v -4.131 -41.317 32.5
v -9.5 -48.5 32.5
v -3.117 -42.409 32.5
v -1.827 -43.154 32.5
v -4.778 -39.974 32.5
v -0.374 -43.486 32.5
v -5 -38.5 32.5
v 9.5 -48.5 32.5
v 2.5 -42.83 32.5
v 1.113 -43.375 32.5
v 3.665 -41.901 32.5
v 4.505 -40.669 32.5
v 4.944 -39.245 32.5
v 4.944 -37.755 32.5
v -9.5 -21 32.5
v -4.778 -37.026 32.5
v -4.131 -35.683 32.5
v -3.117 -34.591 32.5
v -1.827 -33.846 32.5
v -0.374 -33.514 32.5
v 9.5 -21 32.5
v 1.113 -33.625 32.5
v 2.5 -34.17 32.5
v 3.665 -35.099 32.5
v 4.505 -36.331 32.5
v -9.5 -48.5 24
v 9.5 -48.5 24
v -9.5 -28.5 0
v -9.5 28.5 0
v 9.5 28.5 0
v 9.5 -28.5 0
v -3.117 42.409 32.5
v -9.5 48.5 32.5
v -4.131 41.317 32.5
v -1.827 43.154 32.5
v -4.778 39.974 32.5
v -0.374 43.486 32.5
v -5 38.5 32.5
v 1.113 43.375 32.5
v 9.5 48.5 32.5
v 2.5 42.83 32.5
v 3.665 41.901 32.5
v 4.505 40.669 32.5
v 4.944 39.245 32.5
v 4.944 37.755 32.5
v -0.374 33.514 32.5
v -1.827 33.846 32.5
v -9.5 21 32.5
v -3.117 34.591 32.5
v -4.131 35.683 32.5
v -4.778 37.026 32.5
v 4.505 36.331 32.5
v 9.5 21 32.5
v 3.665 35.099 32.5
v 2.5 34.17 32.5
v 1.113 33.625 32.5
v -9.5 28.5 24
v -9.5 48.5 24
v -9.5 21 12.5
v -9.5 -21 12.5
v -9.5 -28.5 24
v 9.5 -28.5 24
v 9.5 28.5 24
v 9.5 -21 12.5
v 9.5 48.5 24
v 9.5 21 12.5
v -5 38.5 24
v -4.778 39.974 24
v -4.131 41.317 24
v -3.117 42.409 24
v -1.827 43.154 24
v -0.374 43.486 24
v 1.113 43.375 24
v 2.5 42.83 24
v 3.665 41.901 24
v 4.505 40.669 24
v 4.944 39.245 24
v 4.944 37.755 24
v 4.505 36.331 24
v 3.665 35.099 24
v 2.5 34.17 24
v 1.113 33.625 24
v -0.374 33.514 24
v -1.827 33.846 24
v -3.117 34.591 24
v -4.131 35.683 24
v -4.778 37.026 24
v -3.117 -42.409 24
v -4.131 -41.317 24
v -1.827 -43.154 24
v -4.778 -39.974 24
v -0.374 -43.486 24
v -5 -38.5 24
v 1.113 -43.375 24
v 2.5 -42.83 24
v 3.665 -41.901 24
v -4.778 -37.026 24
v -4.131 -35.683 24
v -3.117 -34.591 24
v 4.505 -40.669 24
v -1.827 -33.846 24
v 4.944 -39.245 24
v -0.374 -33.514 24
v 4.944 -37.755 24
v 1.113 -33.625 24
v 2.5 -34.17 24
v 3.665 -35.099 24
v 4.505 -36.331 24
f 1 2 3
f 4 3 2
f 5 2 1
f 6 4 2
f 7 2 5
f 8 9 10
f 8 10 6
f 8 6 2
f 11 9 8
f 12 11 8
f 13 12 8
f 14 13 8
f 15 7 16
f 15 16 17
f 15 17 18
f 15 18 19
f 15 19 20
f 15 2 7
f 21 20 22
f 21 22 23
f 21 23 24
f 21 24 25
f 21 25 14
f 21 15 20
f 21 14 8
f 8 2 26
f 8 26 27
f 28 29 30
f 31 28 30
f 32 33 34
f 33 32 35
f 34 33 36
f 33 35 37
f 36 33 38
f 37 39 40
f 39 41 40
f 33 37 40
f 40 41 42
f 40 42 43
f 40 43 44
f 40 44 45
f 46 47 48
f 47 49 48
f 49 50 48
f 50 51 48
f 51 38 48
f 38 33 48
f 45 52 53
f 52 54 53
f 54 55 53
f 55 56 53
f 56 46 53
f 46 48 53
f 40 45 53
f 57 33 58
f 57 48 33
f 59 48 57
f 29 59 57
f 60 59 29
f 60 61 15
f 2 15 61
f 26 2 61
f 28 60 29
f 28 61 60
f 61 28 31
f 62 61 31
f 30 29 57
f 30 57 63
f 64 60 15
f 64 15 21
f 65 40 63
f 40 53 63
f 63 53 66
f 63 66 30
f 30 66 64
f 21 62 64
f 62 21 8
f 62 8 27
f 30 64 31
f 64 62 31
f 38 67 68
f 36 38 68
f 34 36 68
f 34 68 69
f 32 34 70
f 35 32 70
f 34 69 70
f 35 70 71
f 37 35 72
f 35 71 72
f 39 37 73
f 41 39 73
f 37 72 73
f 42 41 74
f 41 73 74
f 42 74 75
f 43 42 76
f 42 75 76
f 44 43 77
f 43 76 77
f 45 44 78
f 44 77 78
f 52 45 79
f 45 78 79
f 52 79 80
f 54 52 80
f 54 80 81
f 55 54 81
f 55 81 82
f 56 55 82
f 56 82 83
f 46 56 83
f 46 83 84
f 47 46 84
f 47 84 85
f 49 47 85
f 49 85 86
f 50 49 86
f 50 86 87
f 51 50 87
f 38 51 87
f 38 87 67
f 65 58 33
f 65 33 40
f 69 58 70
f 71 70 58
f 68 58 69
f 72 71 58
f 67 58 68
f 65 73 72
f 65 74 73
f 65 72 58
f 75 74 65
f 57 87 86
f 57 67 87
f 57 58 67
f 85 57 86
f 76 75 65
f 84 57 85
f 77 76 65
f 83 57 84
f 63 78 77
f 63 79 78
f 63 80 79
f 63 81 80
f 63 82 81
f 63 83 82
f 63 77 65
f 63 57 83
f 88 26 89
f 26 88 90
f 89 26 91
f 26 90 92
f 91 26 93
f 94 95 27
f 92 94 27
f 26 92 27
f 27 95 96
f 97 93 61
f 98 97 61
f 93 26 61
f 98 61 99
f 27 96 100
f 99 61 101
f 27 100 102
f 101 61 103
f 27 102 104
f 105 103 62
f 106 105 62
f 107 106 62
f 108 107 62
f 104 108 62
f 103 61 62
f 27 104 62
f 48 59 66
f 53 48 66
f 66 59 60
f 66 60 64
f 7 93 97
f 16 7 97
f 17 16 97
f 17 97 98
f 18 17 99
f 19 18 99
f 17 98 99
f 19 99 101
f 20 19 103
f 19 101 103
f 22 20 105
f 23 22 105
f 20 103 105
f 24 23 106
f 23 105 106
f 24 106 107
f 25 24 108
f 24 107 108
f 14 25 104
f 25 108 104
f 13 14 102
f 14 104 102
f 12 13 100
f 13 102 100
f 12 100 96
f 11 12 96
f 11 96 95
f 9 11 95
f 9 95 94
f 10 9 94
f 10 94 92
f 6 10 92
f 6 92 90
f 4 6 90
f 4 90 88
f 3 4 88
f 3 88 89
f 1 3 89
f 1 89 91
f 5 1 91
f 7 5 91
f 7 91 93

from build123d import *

# Parameters (mm, degrees)
SKETCH1_W           = 19
SKETCH1_H           = 57
BOSS_EXTRUDE1_DEPTH = 12.5
SKETCH2_W           = 19
SKETCH2_H           = 7.5
BOSS_EXTRUDE2_DEPTH = 20
SKETCH3_W           = 19
SKETCH3_H           = 8.5
BOSS_EXTRUDE3_DEPTH = 20
SKETCH4_W           = 19
SKETCH4_H           = 8.5
BOSS_EXTRUDE4_DEPTH = 20
SKETCH5_R           = 5
CUT_EXTRUDE1_DEPTH  = 20


with BuildPart() as part:
    # Sketch1 → Boss-Extrude1 (new body)
    with BuildSketch(Plane.XY):
        Rectangle(SKETCH1_W, SKETCH1_H)
    extrude(amount=BOSS_EXTRUDE1_DEPTH)

    # Sketch2 → Boss-Extrude2 (add)
    with BuildSketch(Plane.XY.offset(12.5)):
        with Locations((0, -24.75)):
            Rectangle(SKETCH2_W, SKETCH2_H)
        with Locations((0, 24.75)):
            Rectangle(SKETCH2_W, SKETCH2_H)
    extrude(amount=BOSS_EXTRUDE2_DEPTH)

    # Sketch3 → Boss-Extrude3 (add)
    with BuildSketch(Plane.XZ.offset(28.5)):
        with Locations((0, 28.25)):
            Rectangle(SKETCH3_W, SKETCH3_H)
    extrude(amount=BOSS_EXTRUDE3_DEPTH)

    # Sketch4 → Boss-Extrude4 (add)
    with BuildSketch(Plane(origin=(0, 28.5, 0), x_dir=(1, 0, 0), z_dir=(0, 1, 0))):
        with Locations((0, -28.25)):
            Rectangle(SKETCH4_W, SKETCH4_H)
    extrude(amount=BOSS_EXTRUDE4_DEPTH)

    # Sketch5 → Cut-Extrude1 (cut)
    with BuildSketch(Plane(origin=(0, 0, 24), x_dir=(-1, 0, 0), z_dir=(0, 0, -1))):
        with Locations((0, 38.5)):
            Circle(SKETCH5_R)
        with Locations((0, -38.5)):
            Circle(SKETCH5_R)
    extrude(amount=-CUT_EXTRUDE1_DEPTH, mode=Mode.SUBTRACT)


solid = part.part
